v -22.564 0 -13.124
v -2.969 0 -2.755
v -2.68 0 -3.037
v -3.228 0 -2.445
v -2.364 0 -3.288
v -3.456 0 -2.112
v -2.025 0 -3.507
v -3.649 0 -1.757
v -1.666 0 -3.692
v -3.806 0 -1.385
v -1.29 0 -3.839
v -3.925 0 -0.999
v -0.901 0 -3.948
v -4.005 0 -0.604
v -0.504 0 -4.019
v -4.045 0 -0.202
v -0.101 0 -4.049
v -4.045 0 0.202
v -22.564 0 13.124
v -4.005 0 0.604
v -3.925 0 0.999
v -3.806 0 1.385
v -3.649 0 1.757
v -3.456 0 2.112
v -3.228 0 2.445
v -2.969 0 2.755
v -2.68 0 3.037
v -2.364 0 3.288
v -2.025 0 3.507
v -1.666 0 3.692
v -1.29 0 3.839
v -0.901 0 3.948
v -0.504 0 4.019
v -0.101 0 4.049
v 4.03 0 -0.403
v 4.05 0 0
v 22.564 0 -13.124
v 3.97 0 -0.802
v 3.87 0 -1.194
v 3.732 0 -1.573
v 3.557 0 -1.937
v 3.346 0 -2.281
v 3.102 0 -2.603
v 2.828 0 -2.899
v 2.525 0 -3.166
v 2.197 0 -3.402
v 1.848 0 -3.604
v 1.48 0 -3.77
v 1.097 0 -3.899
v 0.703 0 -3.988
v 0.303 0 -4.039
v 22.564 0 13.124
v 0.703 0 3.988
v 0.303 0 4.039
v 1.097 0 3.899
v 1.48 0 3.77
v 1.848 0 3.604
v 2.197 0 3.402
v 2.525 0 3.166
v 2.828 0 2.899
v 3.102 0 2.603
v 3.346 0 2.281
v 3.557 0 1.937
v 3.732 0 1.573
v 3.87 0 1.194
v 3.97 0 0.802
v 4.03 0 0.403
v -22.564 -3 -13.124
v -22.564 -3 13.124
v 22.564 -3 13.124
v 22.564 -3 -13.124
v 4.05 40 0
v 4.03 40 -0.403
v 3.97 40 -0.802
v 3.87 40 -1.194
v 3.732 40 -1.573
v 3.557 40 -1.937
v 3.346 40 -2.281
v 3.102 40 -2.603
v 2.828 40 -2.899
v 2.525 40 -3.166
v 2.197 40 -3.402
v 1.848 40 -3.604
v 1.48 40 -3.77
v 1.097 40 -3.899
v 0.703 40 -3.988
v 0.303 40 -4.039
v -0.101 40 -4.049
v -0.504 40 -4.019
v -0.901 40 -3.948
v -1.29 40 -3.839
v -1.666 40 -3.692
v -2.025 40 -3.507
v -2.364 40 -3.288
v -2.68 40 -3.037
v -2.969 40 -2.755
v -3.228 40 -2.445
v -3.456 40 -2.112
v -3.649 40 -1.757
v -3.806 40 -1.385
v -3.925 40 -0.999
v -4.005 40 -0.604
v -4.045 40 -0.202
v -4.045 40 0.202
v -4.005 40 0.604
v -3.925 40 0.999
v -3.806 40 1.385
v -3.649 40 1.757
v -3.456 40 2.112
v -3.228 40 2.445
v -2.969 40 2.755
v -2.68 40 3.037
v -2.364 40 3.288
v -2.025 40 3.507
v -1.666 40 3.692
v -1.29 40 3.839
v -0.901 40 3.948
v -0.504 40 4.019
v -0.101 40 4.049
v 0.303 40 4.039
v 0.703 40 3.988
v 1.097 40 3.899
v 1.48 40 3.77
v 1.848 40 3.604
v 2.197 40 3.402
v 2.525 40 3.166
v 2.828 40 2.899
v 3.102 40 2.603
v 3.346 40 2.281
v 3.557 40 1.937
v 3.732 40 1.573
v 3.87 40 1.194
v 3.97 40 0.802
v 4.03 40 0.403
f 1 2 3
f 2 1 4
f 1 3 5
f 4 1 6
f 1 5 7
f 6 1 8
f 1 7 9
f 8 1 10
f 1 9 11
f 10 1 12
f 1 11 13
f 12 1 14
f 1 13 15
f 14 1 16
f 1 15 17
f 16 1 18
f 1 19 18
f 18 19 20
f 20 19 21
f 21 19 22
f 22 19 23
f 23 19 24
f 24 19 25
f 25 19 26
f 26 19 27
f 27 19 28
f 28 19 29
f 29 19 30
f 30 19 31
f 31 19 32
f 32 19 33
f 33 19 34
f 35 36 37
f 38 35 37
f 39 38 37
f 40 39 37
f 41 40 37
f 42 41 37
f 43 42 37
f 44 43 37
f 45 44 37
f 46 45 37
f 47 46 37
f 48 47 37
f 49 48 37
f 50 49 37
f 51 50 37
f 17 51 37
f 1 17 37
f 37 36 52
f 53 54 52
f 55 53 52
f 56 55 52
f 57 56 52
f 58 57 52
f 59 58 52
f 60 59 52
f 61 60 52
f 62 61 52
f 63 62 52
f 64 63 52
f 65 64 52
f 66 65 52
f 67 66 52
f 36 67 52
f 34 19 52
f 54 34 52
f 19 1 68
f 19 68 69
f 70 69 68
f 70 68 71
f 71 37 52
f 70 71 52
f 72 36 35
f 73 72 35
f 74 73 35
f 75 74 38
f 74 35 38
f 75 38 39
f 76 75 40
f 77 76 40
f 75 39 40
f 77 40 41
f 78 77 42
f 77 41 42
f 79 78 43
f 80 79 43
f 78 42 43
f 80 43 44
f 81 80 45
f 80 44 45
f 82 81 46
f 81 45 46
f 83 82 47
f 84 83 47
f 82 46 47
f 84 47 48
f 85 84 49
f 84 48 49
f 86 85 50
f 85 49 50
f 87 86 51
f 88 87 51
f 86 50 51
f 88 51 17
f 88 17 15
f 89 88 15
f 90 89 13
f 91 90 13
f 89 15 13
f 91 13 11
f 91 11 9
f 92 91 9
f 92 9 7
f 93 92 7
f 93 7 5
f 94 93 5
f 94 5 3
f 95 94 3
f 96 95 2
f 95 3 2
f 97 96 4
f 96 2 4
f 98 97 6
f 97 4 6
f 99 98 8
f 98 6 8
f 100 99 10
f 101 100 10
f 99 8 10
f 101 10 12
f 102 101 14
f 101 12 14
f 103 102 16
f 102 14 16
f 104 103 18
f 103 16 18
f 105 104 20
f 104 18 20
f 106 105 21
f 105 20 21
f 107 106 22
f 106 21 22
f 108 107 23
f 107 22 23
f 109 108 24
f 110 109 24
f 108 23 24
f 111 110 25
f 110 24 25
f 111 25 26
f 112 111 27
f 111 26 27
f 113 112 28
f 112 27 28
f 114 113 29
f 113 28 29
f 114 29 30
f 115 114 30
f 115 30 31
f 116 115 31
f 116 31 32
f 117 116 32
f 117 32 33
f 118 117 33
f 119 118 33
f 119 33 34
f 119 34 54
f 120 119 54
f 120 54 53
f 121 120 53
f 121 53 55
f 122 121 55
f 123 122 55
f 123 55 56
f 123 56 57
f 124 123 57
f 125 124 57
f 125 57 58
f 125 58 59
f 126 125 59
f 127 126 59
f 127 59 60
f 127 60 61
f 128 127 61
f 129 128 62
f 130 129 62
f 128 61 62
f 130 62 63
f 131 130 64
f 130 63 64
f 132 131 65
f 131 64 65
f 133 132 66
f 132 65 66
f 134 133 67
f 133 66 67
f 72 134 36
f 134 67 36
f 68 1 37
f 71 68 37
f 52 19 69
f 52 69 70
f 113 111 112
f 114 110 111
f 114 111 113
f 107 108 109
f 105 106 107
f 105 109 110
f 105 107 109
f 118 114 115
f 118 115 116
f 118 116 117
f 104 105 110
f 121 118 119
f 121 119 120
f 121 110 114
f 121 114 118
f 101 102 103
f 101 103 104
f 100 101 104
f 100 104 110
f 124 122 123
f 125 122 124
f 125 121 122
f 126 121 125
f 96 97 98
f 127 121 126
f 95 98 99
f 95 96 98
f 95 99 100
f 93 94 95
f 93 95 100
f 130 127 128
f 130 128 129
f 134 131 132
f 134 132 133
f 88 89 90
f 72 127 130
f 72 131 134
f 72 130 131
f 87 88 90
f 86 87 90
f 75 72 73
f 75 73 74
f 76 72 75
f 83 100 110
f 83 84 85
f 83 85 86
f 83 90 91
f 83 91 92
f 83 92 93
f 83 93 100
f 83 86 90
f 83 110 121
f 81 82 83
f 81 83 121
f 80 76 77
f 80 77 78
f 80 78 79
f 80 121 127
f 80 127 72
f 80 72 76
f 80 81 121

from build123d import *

# Parameters (mm, degrees)
SKETCH1_R           = 4.05
BOSS_EXTRUDE1_DEPTH = 40
SKETCH2_W           = 45.127997656
SKETCH2_H           = 26.248845412
BOSS_EXTRUDE2_DEPTH = 3


with BuildPart() as part:
    # Sketch1 → Boss-Extrude1 (new body)
    with BuildSketch(Plane(origin=(0, 0, 0), x_dir=(1, 0, 0), z_dir=(0, 1, 0))):
        Circle(SKETCH1_R)
    extrude(amount=BOSS_EXTRUDE1_DEPTH)

    # Sketch2 → Boss-Extrude2 (add)
    with BuildSketch(Plane.XZ):
        Rectangle(SKETCH2_W, SKETCH2_H)
    extrude(amount=BOSS_EXTRUDE2_DEPTH)


solid = part.part
